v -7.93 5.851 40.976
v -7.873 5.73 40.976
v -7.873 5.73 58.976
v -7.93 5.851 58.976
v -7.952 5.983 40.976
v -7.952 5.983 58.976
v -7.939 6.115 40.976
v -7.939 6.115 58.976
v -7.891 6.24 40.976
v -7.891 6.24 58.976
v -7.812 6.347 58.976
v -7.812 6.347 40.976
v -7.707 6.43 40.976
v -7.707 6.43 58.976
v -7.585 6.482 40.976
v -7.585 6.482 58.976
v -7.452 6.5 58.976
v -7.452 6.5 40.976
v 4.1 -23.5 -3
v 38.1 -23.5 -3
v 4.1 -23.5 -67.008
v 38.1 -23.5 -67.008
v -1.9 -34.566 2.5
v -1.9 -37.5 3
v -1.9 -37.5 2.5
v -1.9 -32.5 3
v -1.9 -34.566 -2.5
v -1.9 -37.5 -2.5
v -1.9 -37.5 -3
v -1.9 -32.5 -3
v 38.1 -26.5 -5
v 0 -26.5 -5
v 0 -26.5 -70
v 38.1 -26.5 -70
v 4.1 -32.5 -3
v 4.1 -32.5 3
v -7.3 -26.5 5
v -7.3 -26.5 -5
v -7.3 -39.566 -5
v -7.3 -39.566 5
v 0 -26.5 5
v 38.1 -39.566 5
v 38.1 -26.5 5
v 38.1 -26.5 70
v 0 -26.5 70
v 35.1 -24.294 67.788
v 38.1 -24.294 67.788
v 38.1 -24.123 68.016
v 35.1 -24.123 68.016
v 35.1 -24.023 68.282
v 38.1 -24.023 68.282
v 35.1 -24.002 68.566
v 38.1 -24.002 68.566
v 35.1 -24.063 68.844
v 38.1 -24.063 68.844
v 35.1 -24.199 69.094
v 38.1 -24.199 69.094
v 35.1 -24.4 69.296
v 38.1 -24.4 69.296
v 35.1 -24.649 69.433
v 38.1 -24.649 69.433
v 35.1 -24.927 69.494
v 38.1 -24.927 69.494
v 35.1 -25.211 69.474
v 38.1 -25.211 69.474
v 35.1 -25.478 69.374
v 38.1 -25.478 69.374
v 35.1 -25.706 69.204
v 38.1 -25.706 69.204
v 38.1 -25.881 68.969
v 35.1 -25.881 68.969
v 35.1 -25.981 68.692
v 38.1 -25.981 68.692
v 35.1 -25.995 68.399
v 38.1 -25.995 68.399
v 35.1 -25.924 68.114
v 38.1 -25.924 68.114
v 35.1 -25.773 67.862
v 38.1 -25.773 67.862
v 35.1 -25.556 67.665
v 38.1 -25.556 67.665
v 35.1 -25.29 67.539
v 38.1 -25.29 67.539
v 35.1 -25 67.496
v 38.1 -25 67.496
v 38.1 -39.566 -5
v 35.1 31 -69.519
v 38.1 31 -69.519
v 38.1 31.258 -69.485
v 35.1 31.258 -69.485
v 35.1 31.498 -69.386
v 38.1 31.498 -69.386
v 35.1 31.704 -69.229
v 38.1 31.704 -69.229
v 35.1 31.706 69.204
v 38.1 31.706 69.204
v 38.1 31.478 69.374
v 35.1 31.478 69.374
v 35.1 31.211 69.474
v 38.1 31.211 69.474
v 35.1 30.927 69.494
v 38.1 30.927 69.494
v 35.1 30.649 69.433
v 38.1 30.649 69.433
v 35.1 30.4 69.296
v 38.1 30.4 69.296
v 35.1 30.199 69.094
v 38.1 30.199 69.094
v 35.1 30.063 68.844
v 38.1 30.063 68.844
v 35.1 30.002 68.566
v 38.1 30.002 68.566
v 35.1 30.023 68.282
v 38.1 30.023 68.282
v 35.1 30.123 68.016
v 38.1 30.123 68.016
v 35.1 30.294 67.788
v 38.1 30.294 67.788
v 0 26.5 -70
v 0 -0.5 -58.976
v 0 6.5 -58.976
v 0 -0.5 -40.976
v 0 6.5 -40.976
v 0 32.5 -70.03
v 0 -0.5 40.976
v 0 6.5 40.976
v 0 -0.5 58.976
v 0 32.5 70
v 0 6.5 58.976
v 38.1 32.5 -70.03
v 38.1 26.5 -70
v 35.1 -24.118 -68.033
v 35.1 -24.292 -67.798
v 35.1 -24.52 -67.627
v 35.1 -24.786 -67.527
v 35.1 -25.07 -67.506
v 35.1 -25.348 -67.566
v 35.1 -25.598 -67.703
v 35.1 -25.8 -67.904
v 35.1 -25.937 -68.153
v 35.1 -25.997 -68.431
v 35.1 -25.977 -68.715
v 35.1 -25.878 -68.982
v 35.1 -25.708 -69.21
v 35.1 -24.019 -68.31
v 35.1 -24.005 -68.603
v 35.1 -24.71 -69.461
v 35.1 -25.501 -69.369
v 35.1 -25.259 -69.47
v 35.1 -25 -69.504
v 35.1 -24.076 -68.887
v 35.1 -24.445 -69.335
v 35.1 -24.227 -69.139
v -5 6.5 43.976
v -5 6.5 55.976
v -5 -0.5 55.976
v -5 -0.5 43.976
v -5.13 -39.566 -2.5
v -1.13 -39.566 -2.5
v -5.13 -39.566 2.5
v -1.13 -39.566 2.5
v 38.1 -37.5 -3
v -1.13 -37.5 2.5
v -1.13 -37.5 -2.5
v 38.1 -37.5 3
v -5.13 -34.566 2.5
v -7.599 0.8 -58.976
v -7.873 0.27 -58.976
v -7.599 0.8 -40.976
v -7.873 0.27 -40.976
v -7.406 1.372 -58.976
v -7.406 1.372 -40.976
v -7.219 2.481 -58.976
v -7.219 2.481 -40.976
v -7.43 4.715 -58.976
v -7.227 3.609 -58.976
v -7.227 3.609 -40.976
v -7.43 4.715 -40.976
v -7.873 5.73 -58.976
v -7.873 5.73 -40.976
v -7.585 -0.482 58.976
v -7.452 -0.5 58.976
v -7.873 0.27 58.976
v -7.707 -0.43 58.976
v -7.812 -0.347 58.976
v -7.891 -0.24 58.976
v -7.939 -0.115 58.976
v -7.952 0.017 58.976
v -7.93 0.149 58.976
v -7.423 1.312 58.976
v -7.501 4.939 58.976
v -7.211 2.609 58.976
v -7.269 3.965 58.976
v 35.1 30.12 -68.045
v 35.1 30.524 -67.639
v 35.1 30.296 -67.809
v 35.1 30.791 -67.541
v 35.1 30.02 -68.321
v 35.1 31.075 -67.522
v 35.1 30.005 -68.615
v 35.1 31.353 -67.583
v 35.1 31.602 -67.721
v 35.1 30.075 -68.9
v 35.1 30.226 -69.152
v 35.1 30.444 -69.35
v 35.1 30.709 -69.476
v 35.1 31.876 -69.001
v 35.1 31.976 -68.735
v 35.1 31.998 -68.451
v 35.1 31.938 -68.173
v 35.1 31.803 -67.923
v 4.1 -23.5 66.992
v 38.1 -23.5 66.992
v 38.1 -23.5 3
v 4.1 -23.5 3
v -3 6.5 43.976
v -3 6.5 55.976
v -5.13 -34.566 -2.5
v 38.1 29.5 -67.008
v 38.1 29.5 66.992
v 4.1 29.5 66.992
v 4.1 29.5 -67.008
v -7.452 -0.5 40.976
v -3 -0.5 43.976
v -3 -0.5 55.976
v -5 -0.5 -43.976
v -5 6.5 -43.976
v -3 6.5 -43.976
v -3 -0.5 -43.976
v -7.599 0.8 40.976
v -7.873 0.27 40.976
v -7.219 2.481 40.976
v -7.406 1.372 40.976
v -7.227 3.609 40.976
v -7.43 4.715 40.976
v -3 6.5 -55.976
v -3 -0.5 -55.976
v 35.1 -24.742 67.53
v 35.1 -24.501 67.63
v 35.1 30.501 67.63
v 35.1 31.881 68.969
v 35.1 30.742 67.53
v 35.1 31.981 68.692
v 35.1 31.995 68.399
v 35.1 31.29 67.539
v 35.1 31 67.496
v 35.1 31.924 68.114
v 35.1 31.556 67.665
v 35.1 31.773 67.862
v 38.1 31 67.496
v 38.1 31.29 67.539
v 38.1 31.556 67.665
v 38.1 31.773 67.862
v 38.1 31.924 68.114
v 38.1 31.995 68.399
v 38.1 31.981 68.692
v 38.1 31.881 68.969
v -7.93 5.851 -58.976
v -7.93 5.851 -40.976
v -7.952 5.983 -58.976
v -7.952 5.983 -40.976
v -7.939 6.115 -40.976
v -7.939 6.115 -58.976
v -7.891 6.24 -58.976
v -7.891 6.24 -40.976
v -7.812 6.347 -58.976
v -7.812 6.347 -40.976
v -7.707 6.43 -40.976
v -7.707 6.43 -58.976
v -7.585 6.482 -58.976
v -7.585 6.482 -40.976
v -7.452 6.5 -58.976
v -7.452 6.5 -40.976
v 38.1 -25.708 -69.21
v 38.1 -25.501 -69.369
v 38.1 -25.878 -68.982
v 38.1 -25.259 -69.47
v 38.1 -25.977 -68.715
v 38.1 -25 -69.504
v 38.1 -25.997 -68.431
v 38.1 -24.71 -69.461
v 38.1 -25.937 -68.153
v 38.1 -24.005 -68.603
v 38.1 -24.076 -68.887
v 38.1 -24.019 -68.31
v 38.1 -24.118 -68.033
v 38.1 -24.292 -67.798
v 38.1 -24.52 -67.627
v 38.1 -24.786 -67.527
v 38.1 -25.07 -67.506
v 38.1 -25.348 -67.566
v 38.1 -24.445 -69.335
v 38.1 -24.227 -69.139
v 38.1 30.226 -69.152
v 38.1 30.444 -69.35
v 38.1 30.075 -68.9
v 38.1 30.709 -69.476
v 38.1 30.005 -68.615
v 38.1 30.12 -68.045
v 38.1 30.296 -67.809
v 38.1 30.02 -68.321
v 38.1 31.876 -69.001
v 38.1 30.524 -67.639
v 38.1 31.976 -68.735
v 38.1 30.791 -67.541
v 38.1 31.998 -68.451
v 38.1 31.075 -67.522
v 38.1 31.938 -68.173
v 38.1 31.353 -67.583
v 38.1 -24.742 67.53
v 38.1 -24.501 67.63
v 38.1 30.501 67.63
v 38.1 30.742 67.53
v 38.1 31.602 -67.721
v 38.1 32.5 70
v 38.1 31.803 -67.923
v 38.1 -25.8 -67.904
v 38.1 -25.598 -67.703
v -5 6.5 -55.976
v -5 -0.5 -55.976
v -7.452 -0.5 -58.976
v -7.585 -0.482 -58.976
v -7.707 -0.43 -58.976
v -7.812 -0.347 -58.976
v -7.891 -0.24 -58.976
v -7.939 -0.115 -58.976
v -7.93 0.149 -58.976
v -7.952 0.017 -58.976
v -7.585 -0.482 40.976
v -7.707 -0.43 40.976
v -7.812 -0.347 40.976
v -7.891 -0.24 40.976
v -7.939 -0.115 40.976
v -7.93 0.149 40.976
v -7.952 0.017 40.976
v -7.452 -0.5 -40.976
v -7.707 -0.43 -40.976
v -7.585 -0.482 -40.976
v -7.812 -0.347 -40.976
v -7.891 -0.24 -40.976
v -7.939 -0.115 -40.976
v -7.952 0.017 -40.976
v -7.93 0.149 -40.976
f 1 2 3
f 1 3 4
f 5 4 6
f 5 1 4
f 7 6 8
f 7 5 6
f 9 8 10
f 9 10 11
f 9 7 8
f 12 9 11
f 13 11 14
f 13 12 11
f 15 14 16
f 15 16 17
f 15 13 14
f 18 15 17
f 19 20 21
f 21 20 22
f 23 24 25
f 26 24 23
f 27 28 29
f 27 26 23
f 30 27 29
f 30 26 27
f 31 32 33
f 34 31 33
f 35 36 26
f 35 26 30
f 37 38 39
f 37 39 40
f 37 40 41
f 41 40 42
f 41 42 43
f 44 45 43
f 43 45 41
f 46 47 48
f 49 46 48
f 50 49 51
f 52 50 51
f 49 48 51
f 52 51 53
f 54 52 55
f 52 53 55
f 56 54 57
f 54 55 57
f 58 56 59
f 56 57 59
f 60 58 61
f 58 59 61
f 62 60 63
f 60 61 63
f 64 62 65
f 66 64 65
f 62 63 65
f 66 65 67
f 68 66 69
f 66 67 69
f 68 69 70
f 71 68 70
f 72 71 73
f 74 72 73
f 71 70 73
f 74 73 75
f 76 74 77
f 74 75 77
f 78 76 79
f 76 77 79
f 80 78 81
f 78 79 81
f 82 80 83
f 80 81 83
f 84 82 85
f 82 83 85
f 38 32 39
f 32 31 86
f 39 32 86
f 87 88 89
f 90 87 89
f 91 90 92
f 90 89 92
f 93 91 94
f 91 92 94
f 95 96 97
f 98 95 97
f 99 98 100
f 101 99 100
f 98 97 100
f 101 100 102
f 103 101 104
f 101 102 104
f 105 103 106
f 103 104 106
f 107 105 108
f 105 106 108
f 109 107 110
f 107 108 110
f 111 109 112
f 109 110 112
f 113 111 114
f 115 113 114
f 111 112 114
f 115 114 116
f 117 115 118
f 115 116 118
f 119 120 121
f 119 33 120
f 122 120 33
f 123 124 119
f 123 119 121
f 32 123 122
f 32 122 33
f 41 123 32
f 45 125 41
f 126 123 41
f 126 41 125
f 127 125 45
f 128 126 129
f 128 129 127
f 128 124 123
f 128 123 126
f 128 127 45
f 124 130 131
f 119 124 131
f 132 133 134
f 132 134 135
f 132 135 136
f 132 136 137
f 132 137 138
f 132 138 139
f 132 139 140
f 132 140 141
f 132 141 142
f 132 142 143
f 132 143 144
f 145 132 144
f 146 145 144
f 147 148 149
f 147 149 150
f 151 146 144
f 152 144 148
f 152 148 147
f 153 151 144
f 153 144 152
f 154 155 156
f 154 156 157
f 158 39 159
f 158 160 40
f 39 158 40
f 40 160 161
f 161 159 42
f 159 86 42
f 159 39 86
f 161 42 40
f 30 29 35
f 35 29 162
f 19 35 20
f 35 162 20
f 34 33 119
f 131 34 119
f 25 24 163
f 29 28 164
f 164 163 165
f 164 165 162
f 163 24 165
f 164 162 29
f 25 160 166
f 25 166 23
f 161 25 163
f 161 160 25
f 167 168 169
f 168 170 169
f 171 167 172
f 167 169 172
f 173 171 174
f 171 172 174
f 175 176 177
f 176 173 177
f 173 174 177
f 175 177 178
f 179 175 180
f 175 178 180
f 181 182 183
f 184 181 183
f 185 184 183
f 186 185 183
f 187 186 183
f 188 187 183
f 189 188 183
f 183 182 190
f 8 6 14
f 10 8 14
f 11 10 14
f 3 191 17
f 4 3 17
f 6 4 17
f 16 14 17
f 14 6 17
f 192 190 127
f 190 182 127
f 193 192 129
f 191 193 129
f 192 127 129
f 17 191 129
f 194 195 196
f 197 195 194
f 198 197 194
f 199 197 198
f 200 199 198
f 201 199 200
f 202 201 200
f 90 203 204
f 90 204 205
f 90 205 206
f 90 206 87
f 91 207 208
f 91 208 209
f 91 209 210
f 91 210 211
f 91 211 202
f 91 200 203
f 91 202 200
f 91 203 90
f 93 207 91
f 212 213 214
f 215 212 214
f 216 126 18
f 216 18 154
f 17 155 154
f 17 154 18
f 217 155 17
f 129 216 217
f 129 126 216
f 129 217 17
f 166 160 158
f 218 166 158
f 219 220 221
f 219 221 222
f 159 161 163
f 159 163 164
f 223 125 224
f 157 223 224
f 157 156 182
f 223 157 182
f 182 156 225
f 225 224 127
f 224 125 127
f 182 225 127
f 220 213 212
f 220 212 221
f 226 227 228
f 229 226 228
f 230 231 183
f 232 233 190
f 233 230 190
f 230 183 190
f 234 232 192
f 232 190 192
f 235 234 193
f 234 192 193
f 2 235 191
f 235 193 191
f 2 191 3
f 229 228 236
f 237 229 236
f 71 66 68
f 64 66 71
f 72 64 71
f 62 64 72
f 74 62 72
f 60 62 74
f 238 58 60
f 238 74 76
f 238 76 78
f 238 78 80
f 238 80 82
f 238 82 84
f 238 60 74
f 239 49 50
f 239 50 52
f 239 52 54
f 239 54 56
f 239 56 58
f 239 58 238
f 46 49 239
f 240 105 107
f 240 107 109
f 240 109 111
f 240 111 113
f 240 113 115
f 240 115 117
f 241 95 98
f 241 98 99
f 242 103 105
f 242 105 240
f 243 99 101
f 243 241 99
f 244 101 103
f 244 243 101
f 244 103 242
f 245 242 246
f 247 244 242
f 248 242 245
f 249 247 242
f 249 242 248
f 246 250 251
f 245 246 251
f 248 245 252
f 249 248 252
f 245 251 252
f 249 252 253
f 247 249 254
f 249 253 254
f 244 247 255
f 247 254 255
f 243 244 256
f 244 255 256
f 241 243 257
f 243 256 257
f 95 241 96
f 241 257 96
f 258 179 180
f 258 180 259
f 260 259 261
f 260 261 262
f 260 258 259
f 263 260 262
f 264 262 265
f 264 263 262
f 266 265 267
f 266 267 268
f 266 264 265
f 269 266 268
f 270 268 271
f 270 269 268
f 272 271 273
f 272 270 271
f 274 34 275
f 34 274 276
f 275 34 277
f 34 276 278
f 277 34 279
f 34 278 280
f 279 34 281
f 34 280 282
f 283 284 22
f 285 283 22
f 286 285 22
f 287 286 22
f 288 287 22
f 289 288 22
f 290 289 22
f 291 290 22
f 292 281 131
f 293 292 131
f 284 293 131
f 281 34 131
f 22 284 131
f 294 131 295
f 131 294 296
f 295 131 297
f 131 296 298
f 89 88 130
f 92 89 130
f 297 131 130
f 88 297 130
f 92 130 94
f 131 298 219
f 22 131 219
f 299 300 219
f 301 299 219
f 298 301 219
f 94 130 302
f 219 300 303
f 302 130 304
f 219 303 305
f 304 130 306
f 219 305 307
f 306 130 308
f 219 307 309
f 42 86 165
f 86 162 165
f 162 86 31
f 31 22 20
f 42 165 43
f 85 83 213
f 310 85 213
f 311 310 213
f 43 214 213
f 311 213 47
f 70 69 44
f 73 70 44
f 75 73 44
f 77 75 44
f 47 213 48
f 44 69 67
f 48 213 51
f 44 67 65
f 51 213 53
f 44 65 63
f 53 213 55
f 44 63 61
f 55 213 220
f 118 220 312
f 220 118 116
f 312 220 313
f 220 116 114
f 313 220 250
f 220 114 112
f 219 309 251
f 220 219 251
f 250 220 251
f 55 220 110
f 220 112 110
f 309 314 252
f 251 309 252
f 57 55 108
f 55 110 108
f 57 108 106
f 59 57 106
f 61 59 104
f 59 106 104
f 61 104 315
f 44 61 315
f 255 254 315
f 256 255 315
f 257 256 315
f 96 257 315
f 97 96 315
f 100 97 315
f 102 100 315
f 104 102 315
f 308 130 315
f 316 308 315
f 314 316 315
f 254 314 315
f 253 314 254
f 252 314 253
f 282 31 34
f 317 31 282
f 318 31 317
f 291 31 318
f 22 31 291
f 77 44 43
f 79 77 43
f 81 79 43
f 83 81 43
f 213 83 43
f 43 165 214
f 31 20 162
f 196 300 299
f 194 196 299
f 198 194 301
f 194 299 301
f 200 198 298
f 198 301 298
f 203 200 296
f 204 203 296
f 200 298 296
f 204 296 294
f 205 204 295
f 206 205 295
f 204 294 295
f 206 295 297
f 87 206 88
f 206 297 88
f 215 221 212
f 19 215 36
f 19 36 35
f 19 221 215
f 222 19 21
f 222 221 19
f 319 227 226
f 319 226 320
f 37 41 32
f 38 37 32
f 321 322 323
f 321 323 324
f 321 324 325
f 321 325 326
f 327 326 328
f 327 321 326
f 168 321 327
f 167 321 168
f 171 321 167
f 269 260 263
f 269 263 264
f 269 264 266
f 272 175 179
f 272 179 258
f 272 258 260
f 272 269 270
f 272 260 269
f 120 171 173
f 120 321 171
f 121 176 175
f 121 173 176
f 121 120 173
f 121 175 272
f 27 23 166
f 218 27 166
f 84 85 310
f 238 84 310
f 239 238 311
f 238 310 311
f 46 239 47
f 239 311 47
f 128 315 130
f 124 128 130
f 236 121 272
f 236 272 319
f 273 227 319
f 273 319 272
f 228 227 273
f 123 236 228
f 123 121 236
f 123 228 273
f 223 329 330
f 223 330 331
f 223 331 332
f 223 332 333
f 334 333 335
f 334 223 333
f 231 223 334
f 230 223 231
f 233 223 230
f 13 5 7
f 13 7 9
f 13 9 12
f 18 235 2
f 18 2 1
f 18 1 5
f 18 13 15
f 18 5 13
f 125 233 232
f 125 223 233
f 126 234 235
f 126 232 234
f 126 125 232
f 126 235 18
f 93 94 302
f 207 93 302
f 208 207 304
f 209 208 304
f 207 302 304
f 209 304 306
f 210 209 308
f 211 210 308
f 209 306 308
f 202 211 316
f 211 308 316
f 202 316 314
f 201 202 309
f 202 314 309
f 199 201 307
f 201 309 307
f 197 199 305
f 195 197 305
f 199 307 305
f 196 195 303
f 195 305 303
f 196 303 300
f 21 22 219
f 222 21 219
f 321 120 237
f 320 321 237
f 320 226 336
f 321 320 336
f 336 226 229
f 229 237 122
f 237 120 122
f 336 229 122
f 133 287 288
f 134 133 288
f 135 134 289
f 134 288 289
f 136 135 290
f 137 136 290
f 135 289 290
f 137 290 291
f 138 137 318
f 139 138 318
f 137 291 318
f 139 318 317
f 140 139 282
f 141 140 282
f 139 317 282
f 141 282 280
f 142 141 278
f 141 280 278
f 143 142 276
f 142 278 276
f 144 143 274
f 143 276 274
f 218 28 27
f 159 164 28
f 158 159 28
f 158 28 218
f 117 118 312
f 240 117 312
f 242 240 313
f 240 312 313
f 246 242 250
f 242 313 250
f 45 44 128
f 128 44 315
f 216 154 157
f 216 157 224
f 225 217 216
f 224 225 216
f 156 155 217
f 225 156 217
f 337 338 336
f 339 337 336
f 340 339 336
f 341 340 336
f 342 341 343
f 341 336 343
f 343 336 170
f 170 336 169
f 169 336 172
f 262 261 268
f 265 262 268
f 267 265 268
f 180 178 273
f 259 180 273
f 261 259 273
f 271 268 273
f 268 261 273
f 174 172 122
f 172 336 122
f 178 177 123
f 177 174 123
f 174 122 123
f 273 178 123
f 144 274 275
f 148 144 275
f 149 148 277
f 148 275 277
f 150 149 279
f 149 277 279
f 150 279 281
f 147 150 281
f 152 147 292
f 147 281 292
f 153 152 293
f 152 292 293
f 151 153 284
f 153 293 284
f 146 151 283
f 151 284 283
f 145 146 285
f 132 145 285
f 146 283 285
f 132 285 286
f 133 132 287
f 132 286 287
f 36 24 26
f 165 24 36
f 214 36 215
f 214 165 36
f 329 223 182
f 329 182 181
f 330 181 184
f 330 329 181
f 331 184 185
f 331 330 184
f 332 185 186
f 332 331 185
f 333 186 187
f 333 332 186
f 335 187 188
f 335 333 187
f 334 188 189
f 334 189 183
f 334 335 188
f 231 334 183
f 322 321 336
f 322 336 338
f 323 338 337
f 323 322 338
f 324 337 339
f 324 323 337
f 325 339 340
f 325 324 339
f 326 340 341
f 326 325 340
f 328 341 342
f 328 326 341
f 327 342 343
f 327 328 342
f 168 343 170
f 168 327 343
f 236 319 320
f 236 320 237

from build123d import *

# Parameters (mm, degrees)
SKETCH1_W           = 140
SKETCH1_H           = 53
BOSS_EXTRUDE1_DEPTH = 38.1
BOSS_EXTRUDE2_DEPTH = 45.4
CUT_EXTRUDE1_DEPTH  = 5
BOSS_EXTRUDE3_DEPTH = 45.4
BOSS_EXTRUDE4_DEPTH = 38.1
SKETCH11_W          = 134
SKETCH11_H          = 53
CUT_EXTRUDE2_DEPTH  = 34
SKETCH12_W          = 6
SKETCH12_H          = 14
CUT_EXTRUDE3_DEPTH  = 34
SKETCH13_W          = 6
SKETCH13_H          = 5
CUT_EXTRUDE4_DEPTH  = 6
CUT_EXTRUDE6_DEPTH  = 3
CUT_EXTRUDE7_DEPTH  = 3
SKETCH17_W          = 18
SKETCH17_H          = 7
BOSS_EXTRUDE5_DEPTH = 9
SKETCH21_W          = 2
SKETCH21_H          = 12
CUT_EXTRUDE10_DEPTH = 93.075528643
SKETCH23_RX         = 3.5
SKETCH23_RY         = 1.800693379
CUT_EXTRUDE12_DEPTH = 141.213025648
FILLET3_START       = -60
FILLET3_DEPTH       = 120


with BuildPart() as part:
    # Sketch1 → Boss-Extrude1 (new body)
    with BuildSketch(Plane(origin=(0, 0, 0), x_dir=(0, 0, -1), z_dir=(1, 0, 0))):
        Rectangle(SKETCH1_W, SKETCH1_H)
    extrude(amount=BOSS_EXTRUDE1_DEPTH)

    # Sketch2 → Boss-Extrude2 (add)
    with BuildSketch(Plane(origin=(38.1, 0, 0), x_dir=(0, 0, -1), z_dir=(1, 0, 0))):
        Polygon((0, -26.5), (5, -26.5), (5, -39.566040215), (-4.99956385, -39.566040215), (-4.99956385, -26.566040215), align=None)
    extrude(amount=-BOSS_EXTRUDE2_DEPTH)

    # Sketch3 → Cut-Extrude1 (cut)
    with BuildSketch(Plane.XZ.offset(39.566040215)):
        Polygon((-5.130369, 0), (-5.130369, 2.5), (-1.130369, 2.5), (-1.130369, -2.5), (-5.130369, -2.5), align=None)
    extrude(amount=-CUT_EXTRUDE1_DEPTH, mode=Mode.SUBTRACT)

    # Sketch7 → Boss-Extrude3 (add)
    with BuildSketch(Plane(origin=(38.1, 0, 0), x_dir=(0, 0, -1), z_dir=(1, 0, 0))):
        Polygon((-4.99956385, -26.566040215), (-4.99956385, -26.5), (0, -26.5), align=None)
    extrude(amount=-BOSS_EXTRUDE3_DEPTH)

    # Sketch8 → Boss-Extrude4 (add)
    with BuildSketch(Plane(origin=(38.1, 0, 0), x_dir=(0, 0, -1), z_dir=(1, 0, 0))):
        Polygon((-70, 26.5), (-70, 32.5), (70.030085777, 32.5), (70, 26.5), align=None)
    extrude(amount=-BOSS_EXTRUDE4_DEPTH)

    # Sketch11 → Cut-Extrude2 (cut)
    with BuildSketch(Plane(origin=(38.1, 0, 0), x_dir=(0, 0, -1), z_dir=(1, 0, 0))):
        with Locations((0.007630482, 3)):
            Rectangle(SKETCH11_W, SKETCH11_H)
    extrude(amount=-CUT_EXTRUDE2_DEPTH, mode=Mode.SUBTRACT)

    # Sketch12 → Cut-Extrude3 (cut)
    with BuildSketch(Plane(origin=(38.1, 0, 0), x_dir=(0, 0, -1), z_dir=(1, 0, 0))):
        with Locations((0.000218075, -30.5)):
            Rectangle(SKETCH12_W, SKETCH12_H)
    extrude(amount=-CUT_EXTRUDE3_DEPTH, mode=Mode.SUBTRACT)

    # Sketch13 → Cut-Extrude4 (cut)
    with BuildSketch(Plane(origin=(4.1, 0, 0), x_dir=(0, 0, -1), z_dir=(1, 0, 0))):
        with Locations((0.000218075, -35)):
            Rectangle(SKETCH13_W, SKETCH13_H)
    extrude(amount=-CUT_EXTRUDE4_DEPTH, mode=Mode.SUBTRACT)

    # Sketch15 → Cut-Extrude6 (cut)
    with BuildSketch(Plane(origin=(38.1, 0, 0), x_dir=(0, 0, -1), z_dir=(1, 0, 0))):
        with BuildLine():
            ThreePointArc((-67.496184759, 31), (-68.114088128, 31.924122375), (-69.204189088, 31.706208093))
            Line((-69.204189088, 31.706208093), (-67.78818043, 30.293791907))
            ThreePointArc((-67.78818043, 30.293791907), (-67.572062384, 30.617903369), (-67.496184759, 31))
        make_face()
        with BuildLine():
            Line((-67.78818043, 30.293791907), (-69.204189088, 31.706208093))
            ThreePointArc((-69.204189088, 31.706208093), (-69.202392852, 30.291995671), (-67.78818043, 30.293791907))
        make_face()
    extrude(amount=-CUT_EXTRUDE6_DEPTH, mode=Mode.SUBTRACT)

    # Sketch16 → Cut-Extrude7 (cut)
    with BuildSketch(Plane(origin=(38.1, 0, 0), x_dir=(0, 0, -1), z_dir=(1, 0, 0))):
        with BuildLine():
            ThreePointArc((69.228596491, 31.70446537), (67.814392759, 31.709738362), (67.809119767, 30.29553463))
            Line((67.809119767, 30.29553463), (69.228596491, 31.70446537))
        make_face()
        with BuildLine():
            Line((69.228596491, 31.70446537), (67.809119767, 30.29553463))
            ThreePointArc((67.809119767, 30.29553463), (68.899818519, 30.075408641), (69.518858129, 31))
            ThreePointArc((69.518858129, 31), (69.443449488, 31.38096039), (69.228596491, 31.70446537))
        make_face()
        with BuildLine():
            ThreePointArc((69.503815241, -25), (68.887086814, -24.076364303), (67.797609438, -24.291993387))
            Line((67.797609438, -24.291993387), (69.210021043, -25.708006613))
            ThreePointArc((69.210021043, -25.708006613), (69.427450938, -25.383271573), (69.503815241, -25))
        make_face()
        with BuildLine():
            Line((69.210021043, -25.708006613), (67.797609438, -24.291993387))
            ThreePointArc((67.797609438, -24.291993387), (67.795808628, -25.706205803), (69.210021043, -25.708006613))
        make_face()
        with BuildLine():
            ThreePointArc((-67.496184759, -25), (-67.572062384, -24.617903369), (-67.78818043, -24.293791907))
            Line((-67.78818043, -24.293791907), (-69.204189088, -25.706208093))
            ThreePointArc((-69.204189088, -25.706208093), (-68.114088128, -25.924122375), (-67.496184759, -25))
        make_face()
        with BuildLine():
            Line((-69.204189088, -25.706208093), (-67.78818043, -24.293791907))
            ThreePointArc((-67.78818043, -24.293791907), (-69.202392852, -24.291995671), (-69.204189088, -25.706208093))
        make_face()
    extrude(amount=-CUT_EXTRUDE7_DEPTH, mode=Mode.SUBTRACT)

    # Sketch17 → Boss-Extrude5 (add)
    with BuildSketch(Plane.ZY):
        with Locations((49.976158348, 3)):
            Rectangle(SKETCH17_W, SKETCH17_H)
        with Locations((-49.976158348, 3)):
            Rectangle(SKETCH17_W, SKETCH17_H)
    extrude(amount=BOSS_EXTRUDE5_DEPTH)

    # Sketch21 → Cut-Extrude10 (cut, through all)
    with BuildSketch(Plane(origin=(0, 6.5, 0), x_dir=(1, 0, 0), z_dir=(0, 1, 0))):
        with Locations((-4, -49.976158348)):
            Rectangle(SKETCH21_W, SKETCH21_H)
        with Locations((-4, 49.976158348)):
            Rectangle(SKETCH21_W, SKETCH21_H)
    extrude(amount=-CUT_EXTRUDE10_DEPTH, mode=Mode.SUBTRACT)

    # Sketch23 → Cut-Extrude12 (cut, through all)
    with BuildSketch(Plane.XY.offset(58.976158348)):
        with Locations(Location((-9, 3), (0, 0, 90))):
            Ellipse(SKETCH23_RX, SKETCH23_RY)
    extrude(amount=-CUT_EXTRUDE12_DEPTH, mode=Mode.SUBTRACT)

    # Fillet3: read off the stored shape, not the designer's step
    # Fillet3 outline → Fillet3 (cut)
    with BuildSketch(Plane.XY.offset(FILLET3_START)):
        with BuildLine():
            ThreePointArc((-7.452330452, -0.5), (-7.891056374, -0.239832369), (-7.873213162, 0.269921739))
            add(Edge.make_bspline(
                [(-9, -0.5), (-8.366981638, -0.5), (-7.873213162, 0.269921739)],
                knots=[3.141592654, 3.141592654, 3.141592654, 3.823261415, 3.823261415, 3.823261415], degree=2, weights=[1, 0.872894942, 0.856107875]))
            Line((-9, -0.5), (-7.452330452, -0.5))
        make_face()
        with BuildLine():
            add(Edge.make_bspline(
                [(-7.873213161, 5.730078261), (-8.366981638, 6.5), (-9, 6.5)],
                knots=[5.601516546, 5.601516546, 5.601516546, 6.283185307, 6.283185307, 6.283185307], degree=2, weights=[0.856107875, 0.872894942, 1]))
            ThreePointArc((-7.873213161, 5.730078261), (-7.891056374, 6.239832369), (-7.452330452, 6.5))
            Line((-7.452330452, 6.5), (-9, 6.5))
        make_face()
    extrude(amount=FILLET3_DEPTH, mode=Mode.SUBTRACT)


solid = part.part
